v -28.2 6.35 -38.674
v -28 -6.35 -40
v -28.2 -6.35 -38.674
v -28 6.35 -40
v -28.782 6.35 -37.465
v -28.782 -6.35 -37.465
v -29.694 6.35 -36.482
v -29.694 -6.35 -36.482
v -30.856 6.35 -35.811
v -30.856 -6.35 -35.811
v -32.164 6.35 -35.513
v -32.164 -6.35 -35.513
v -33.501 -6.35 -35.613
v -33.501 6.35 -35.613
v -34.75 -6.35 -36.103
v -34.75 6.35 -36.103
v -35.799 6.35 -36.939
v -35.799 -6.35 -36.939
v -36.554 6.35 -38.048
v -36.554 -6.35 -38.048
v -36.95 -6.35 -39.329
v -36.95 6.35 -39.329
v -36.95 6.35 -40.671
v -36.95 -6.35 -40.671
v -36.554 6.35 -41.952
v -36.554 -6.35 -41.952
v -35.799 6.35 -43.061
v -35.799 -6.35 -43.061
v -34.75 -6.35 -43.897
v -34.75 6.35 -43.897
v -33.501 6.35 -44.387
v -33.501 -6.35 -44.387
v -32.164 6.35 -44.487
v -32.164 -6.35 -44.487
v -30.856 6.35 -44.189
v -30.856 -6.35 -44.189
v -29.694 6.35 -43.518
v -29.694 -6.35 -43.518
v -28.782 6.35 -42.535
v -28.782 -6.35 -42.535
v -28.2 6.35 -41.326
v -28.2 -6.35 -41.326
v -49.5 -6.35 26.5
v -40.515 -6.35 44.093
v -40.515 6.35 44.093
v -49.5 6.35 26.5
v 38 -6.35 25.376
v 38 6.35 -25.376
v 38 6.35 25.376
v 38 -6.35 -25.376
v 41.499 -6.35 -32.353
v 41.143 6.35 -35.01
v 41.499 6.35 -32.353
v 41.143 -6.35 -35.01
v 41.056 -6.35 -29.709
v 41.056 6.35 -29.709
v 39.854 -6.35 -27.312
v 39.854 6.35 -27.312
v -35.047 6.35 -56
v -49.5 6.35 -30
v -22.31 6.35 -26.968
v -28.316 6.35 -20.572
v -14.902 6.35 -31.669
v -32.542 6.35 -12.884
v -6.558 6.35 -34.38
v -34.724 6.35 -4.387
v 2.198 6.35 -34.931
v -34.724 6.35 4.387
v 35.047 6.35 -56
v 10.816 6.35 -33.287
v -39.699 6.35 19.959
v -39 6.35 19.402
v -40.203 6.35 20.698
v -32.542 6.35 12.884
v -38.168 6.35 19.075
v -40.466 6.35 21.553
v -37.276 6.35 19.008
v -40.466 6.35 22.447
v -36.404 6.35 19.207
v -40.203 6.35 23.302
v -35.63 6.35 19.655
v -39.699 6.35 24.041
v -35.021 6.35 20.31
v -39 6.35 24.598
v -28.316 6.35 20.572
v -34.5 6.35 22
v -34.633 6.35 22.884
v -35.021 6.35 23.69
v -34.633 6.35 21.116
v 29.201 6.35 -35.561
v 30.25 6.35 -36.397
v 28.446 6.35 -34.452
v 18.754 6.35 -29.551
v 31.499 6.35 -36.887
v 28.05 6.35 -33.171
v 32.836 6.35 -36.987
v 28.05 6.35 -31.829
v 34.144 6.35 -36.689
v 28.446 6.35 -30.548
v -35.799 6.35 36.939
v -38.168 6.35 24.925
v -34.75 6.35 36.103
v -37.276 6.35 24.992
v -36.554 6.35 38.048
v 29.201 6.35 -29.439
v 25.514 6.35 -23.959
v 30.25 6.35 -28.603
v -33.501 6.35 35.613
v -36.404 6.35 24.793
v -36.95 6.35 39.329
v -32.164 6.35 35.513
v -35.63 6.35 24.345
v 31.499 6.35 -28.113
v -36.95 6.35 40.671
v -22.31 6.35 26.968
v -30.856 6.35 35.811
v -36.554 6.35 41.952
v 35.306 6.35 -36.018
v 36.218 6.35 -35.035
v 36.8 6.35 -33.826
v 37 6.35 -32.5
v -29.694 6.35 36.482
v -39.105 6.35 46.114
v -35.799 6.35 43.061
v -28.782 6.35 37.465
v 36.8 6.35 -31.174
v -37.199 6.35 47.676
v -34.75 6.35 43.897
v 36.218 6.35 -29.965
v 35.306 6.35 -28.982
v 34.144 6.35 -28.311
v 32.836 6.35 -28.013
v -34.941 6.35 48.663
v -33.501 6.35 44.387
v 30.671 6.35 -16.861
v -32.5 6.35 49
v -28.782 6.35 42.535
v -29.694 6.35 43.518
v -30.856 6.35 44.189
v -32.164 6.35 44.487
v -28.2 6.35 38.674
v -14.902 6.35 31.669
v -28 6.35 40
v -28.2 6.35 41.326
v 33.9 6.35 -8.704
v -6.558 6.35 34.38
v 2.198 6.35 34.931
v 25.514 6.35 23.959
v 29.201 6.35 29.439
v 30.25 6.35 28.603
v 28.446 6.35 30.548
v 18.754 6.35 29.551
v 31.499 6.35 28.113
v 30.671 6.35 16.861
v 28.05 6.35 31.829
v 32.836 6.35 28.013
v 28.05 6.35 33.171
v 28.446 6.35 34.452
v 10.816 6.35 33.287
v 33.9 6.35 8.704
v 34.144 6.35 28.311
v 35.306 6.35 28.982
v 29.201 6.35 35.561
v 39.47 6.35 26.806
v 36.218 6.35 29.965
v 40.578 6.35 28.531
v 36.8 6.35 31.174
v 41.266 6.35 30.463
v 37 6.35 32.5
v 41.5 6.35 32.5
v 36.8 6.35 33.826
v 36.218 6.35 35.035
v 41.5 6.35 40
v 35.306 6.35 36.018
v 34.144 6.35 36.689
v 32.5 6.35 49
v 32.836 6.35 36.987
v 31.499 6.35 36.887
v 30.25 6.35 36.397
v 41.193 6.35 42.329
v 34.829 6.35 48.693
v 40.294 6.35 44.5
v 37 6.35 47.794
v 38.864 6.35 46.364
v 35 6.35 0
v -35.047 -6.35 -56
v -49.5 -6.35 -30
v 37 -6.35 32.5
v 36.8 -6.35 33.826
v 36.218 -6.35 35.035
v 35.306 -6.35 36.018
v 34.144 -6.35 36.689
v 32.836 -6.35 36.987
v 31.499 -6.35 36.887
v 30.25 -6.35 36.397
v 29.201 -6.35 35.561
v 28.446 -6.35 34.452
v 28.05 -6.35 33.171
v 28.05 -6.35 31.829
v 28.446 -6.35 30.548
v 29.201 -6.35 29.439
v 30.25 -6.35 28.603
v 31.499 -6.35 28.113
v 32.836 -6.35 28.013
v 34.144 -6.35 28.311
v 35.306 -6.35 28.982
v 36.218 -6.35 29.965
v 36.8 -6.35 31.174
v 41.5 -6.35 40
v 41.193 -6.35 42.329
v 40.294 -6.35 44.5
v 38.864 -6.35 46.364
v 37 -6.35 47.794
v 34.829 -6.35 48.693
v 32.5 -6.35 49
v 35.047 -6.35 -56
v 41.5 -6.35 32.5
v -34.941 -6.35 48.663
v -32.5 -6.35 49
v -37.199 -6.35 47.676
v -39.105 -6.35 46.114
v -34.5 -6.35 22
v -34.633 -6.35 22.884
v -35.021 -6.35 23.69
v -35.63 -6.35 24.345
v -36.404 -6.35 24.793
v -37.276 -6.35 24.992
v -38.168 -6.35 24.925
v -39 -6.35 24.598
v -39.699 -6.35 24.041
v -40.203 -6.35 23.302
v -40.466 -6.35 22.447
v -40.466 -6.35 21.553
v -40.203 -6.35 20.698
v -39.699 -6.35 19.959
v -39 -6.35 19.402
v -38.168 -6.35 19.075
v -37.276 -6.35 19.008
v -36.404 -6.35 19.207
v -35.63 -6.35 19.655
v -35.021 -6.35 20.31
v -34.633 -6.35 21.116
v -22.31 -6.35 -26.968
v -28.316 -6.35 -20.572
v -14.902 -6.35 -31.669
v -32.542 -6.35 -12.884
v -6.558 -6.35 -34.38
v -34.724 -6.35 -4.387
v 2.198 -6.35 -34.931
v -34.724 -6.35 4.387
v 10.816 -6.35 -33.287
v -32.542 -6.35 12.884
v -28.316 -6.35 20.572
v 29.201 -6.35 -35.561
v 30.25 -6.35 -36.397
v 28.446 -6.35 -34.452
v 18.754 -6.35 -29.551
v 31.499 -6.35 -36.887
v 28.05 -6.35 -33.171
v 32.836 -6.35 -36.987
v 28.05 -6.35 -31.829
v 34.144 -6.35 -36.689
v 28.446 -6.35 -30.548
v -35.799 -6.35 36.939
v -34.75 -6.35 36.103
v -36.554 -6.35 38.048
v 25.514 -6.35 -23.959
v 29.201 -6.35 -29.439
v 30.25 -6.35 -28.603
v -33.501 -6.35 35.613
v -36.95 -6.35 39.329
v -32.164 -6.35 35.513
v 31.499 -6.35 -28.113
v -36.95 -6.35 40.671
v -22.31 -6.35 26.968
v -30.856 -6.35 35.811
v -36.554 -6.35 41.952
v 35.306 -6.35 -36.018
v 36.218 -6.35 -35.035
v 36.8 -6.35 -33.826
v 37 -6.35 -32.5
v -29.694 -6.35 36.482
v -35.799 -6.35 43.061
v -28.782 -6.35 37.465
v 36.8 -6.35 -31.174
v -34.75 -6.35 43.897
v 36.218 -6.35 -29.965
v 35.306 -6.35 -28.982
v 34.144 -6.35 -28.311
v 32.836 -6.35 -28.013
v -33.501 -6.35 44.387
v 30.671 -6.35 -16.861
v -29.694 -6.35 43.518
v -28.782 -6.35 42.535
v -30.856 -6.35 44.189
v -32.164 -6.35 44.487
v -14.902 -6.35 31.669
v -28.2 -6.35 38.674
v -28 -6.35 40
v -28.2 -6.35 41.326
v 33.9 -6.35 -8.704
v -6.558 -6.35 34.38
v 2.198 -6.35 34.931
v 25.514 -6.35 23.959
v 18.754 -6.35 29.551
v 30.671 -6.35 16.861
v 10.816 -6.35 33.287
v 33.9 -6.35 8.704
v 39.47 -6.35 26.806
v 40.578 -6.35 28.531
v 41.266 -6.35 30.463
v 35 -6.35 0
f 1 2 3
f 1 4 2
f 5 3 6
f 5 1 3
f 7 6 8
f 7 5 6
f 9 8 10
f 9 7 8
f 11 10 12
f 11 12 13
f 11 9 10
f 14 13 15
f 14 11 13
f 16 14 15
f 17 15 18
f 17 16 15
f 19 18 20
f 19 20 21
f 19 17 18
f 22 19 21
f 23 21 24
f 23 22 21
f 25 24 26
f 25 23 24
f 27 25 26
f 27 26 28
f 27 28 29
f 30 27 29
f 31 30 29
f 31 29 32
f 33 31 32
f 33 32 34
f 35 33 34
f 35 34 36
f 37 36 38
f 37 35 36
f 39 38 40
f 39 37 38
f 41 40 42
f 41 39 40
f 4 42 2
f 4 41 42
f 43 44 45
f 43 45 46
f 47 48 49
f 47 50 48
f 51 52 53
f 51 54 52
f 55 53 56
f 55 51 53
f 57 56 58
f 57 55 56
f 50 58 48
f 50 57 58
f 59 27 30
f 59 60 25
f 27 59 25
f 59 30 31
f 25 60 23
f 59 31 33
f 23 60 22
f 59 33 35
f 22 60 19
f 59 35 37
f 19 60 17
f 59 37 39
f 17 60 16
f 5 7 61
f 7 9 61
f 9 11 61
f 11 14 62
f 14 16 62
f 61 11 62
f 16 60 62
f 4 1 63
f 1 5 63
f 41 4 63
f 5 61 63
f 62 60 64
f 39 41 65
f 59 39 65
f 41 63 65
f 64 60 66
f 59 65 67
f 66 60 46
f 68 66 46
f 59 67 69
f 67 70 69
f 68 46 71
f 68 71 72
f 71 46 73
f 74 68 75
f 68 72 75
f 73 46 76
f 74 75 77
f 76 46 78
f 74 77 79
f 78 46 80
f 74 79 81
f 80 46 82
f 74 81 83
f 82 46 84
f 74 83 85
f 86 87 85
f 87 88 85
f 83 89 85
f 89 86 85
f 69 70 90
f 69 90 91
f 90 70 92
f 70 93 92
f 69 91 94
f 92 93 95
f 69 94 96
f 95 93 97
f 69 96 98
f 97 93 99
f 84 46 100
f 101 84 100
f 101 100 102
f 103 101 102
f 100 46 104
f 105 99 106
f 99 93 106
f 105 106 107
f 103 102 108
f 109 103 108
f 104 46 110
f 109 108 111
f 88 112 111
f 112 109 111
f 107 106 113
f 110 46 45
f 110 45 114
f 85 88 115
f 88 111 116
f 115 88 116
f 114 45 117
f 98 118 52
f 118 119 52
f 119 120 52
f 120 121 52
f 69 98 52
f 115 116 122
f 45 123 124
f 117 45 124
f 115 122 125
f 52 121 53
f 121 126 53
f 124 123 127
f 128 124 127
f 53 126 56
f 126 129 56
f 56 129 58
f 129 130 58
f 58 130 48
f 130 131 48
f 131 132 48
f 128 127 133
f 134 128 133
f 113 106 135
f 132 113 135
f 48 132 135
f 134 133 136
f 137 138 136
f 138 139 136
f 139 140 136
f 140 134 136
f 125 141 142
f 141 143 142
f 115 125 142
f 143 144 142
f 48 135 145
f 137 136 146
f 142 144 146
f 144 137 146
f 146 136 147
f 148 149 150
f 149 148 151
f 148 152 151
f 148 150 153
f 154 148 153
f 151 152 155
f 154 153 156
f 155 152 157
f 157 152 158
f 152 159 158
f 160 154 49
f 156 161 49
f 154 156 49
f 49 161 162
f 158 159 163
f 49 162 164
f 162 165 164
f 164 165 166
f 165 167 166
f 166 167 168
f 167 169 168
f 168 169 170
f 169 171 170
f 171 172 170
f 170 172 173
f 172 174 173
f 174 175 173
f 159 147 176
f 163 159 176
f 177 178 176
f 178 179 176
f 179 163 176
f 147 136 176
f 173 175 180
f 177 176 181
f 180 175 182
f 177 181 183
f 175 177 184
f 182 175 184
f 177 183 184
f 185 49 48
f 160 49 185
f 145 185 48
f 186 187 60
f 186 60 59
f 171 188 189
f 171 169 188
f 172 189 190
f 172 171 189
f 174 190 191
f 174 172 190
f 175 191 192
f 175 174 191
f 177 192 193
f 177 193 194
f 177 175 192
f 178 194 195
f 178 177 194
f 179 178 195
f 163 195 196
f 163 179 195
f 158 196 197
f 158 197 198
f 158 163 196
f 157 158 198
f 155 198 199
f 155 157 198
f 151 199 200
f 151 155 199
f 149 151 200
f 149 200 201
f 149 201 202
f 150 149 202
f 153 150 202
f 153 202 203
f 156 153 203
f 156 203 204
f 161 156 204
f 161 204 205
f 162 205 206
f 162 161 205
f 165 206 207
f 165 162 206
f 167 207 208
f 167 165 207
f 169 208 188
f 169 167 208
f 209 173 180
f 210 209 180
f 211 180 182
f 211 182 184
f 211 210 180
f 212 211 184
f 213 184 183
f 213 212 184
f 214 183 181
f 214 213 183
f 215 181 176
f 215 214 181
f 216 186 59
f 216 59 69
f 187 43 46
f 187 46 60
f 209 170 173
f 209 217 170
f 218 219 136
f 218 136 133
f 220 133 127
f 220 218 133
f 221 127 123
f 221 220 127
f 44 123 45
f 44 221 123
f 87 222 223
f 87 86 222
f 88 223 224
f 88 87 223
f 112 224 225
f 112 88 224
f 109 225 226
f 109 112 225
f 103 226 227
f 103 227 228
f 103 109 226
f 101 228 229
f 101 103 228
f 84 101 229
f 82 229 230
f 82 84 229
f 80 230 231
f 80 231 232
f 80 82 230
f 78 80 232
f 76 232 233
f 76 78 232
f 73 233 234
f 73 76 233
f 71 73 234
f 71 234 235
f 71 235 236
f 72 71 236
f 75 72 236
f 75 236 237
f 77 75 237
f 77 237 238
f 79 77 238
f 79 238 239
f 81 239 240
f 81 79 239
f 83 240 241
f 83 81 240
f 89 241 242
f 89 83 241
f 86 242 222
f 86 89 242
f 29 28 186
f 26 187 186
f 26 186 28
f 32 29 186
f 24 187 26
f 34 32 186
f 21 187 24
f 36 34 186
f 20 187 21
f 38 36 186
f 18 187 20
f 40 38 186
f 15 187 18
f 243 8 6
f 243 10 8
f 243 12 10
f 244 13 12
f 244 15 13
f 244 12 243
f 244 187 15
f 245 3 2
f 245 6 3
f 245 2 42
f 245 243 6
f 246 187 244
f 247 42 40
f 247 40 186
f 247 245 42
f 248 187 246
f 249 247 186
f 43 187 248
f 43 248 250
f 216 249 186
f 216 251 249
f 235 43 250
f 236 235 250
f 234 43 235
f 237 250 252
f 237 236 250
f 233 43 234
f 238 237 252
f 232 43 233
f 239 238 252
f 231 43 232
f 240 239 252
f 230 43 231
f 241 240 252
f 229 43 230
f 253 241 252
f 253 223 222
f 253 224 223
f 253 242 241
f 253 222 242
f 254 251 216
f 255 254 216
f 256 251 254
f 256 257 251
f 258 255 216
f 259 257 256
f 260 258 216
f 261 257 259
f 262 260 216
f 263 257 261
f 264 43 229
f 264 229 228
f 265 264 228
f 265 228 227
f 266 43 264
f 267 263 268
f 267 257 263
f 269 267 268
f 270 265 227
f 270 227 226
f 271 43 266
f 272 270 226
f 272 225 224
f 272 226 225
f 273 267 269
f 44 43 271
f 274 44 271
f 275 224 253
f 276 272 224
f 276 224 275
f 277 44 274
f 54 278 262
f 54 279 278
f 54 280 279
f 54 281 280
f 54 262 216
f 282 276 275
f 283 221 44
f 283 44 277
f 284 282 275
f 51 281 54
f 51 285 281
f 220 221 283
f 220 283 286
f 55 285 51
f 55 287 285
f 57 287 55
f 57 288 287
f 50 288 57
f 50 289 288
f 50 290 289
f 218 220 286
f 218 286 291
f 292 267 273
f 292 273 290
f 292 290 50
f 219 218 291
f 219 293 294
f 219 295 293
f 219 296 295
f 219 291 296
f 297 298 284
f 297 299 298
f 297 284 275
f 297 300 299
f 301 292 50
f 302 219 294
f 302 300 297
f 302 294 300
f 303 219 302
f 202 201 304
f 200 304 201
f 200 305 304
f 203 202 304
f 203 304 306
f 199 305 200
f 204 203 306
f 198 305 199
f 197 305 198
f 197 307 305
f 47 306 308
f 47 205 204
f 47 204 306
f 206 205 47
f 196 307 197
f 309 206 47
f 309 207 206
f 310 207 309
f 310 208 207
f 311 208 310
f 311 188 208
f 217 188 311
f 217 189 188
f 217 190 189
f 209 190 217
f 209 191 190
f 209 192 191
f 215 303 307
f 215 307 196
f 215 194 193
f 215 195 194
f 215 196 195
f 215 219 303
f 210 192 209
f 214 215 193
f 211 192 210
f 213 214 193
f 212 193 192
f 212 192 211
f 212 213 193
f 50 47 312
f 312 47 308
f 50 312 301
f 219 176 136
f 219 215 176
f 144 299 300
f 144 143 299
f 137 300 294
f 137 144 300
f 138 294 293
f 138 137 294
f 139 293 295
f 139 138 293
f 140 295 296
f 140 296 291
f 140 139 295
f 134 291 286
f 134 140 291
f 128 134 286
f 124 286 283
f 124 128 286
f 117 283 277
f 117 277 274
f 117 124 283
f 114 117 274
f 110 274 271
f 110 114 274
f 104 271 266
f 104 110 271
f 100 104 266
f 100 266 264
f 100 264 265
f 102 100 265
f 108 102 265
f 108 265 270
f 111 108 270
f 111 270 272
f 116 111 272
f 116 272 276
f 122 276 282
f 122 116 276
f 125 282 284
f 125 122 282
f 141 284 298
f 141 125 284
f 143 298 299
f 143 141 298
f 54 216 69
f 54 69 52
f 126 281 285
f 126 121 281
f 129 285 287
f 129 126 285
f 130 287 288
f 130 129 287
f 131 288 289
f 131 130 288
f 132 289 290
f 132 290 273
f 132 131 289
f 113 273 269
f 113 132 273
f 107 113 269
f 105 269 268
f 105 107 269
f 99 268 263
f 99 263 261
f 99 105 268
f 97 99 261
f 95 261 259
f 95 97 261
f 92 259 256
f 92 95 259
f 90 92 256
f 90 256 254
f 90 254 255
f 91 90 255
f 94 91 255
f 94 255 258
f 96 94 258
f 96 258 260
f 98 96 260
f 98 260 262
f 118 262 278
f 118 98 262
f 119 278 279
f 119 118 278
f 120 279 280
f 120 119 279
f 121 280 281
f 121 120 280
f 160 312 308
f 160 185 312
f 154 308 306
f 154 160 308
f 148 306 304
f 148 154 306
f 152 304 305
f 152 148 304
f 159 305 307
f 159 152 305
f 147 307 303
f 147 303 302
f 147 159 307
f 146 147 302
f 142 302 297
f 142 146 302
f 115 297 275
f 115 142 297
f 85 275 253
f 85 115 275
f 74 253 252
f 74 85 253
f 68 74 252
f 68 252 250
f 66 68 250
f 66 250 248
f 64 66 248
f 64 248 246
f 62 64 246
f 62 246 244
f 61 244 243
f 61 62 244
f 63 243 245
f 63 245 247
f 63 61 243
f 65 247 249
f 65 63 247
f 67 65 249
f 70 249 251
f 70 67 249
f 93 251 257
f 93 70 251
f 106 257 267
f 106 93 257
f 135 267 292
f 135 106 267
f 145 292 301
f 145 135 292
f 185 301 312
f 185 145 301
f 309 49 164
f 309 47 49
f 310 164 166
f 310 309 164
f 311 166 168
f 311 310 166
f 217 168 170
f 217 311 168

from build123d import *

# Parameters (mm, degrees)
F0_R     = 4.5
F0_R_2   = 3
F0_R_3   = 35
F1_DEPTH = 6.35


with BuildPart() as f1:
    # F0 (on Front) → F1 (new body, symmetric)
    with BuildSketch(Plane.XZ):
        with BuildLine():
            Line((32.5, 49), (-32.5, 49))
            ThreePointArc((-32.5, 49), (-37.198943, 47.675932), (-40.515282, 44.093318))
            Line((-40.515282, 44.093318), (-49.5, 26.5))
            Line((-49.5, 26.5), (-49.5, -30))
            Line((-49.5, -30), (-35.047059, -56))
            Line((-35.047059, -56), (35.047061, -56))
            Line((35.047061, -56), (41.142898, -35.010043))
            ThreePointArc((41.142898, -35.010043), (41.056204, -29.708696), (38, -25.376097))
            Line((38, -25.376097), (38, 25.376097))
            ThreePointArc((38, 25.376097), (40.577747, 28.531373), (41.5, 32.5))
            Line((41.5, 32.5), (41.5, 40))
            ThreePointArc((41.5, 40), (38.863961, 46.363961), (32.5, 49))
        make_face()
        with Locations((-32.5, -40)):
            Circle(F0_R, mode=Mode.SUBTRACT)
        with Locations((32.5, -32.5)):
            Circle(F0_R, mode=Mode.SUBTRACT)
        with Locations((-37.5, 22)):
            Circle(F0_R_2, mode=Mode.SUBTRACT)
        with Locations((-32.5, 40)):
            Circle(F0_R, mode=Mode.SUBTRACT)
        Circle(F0_R_3, mode=Mode.SUBTRACT)
        with Locations((32.5, 32.5)):
            Circle(F0_R, mode=Mode.SUBTRACT)
    extrude(amount=F1_DEPTH, both=True)


solid = f1.part
